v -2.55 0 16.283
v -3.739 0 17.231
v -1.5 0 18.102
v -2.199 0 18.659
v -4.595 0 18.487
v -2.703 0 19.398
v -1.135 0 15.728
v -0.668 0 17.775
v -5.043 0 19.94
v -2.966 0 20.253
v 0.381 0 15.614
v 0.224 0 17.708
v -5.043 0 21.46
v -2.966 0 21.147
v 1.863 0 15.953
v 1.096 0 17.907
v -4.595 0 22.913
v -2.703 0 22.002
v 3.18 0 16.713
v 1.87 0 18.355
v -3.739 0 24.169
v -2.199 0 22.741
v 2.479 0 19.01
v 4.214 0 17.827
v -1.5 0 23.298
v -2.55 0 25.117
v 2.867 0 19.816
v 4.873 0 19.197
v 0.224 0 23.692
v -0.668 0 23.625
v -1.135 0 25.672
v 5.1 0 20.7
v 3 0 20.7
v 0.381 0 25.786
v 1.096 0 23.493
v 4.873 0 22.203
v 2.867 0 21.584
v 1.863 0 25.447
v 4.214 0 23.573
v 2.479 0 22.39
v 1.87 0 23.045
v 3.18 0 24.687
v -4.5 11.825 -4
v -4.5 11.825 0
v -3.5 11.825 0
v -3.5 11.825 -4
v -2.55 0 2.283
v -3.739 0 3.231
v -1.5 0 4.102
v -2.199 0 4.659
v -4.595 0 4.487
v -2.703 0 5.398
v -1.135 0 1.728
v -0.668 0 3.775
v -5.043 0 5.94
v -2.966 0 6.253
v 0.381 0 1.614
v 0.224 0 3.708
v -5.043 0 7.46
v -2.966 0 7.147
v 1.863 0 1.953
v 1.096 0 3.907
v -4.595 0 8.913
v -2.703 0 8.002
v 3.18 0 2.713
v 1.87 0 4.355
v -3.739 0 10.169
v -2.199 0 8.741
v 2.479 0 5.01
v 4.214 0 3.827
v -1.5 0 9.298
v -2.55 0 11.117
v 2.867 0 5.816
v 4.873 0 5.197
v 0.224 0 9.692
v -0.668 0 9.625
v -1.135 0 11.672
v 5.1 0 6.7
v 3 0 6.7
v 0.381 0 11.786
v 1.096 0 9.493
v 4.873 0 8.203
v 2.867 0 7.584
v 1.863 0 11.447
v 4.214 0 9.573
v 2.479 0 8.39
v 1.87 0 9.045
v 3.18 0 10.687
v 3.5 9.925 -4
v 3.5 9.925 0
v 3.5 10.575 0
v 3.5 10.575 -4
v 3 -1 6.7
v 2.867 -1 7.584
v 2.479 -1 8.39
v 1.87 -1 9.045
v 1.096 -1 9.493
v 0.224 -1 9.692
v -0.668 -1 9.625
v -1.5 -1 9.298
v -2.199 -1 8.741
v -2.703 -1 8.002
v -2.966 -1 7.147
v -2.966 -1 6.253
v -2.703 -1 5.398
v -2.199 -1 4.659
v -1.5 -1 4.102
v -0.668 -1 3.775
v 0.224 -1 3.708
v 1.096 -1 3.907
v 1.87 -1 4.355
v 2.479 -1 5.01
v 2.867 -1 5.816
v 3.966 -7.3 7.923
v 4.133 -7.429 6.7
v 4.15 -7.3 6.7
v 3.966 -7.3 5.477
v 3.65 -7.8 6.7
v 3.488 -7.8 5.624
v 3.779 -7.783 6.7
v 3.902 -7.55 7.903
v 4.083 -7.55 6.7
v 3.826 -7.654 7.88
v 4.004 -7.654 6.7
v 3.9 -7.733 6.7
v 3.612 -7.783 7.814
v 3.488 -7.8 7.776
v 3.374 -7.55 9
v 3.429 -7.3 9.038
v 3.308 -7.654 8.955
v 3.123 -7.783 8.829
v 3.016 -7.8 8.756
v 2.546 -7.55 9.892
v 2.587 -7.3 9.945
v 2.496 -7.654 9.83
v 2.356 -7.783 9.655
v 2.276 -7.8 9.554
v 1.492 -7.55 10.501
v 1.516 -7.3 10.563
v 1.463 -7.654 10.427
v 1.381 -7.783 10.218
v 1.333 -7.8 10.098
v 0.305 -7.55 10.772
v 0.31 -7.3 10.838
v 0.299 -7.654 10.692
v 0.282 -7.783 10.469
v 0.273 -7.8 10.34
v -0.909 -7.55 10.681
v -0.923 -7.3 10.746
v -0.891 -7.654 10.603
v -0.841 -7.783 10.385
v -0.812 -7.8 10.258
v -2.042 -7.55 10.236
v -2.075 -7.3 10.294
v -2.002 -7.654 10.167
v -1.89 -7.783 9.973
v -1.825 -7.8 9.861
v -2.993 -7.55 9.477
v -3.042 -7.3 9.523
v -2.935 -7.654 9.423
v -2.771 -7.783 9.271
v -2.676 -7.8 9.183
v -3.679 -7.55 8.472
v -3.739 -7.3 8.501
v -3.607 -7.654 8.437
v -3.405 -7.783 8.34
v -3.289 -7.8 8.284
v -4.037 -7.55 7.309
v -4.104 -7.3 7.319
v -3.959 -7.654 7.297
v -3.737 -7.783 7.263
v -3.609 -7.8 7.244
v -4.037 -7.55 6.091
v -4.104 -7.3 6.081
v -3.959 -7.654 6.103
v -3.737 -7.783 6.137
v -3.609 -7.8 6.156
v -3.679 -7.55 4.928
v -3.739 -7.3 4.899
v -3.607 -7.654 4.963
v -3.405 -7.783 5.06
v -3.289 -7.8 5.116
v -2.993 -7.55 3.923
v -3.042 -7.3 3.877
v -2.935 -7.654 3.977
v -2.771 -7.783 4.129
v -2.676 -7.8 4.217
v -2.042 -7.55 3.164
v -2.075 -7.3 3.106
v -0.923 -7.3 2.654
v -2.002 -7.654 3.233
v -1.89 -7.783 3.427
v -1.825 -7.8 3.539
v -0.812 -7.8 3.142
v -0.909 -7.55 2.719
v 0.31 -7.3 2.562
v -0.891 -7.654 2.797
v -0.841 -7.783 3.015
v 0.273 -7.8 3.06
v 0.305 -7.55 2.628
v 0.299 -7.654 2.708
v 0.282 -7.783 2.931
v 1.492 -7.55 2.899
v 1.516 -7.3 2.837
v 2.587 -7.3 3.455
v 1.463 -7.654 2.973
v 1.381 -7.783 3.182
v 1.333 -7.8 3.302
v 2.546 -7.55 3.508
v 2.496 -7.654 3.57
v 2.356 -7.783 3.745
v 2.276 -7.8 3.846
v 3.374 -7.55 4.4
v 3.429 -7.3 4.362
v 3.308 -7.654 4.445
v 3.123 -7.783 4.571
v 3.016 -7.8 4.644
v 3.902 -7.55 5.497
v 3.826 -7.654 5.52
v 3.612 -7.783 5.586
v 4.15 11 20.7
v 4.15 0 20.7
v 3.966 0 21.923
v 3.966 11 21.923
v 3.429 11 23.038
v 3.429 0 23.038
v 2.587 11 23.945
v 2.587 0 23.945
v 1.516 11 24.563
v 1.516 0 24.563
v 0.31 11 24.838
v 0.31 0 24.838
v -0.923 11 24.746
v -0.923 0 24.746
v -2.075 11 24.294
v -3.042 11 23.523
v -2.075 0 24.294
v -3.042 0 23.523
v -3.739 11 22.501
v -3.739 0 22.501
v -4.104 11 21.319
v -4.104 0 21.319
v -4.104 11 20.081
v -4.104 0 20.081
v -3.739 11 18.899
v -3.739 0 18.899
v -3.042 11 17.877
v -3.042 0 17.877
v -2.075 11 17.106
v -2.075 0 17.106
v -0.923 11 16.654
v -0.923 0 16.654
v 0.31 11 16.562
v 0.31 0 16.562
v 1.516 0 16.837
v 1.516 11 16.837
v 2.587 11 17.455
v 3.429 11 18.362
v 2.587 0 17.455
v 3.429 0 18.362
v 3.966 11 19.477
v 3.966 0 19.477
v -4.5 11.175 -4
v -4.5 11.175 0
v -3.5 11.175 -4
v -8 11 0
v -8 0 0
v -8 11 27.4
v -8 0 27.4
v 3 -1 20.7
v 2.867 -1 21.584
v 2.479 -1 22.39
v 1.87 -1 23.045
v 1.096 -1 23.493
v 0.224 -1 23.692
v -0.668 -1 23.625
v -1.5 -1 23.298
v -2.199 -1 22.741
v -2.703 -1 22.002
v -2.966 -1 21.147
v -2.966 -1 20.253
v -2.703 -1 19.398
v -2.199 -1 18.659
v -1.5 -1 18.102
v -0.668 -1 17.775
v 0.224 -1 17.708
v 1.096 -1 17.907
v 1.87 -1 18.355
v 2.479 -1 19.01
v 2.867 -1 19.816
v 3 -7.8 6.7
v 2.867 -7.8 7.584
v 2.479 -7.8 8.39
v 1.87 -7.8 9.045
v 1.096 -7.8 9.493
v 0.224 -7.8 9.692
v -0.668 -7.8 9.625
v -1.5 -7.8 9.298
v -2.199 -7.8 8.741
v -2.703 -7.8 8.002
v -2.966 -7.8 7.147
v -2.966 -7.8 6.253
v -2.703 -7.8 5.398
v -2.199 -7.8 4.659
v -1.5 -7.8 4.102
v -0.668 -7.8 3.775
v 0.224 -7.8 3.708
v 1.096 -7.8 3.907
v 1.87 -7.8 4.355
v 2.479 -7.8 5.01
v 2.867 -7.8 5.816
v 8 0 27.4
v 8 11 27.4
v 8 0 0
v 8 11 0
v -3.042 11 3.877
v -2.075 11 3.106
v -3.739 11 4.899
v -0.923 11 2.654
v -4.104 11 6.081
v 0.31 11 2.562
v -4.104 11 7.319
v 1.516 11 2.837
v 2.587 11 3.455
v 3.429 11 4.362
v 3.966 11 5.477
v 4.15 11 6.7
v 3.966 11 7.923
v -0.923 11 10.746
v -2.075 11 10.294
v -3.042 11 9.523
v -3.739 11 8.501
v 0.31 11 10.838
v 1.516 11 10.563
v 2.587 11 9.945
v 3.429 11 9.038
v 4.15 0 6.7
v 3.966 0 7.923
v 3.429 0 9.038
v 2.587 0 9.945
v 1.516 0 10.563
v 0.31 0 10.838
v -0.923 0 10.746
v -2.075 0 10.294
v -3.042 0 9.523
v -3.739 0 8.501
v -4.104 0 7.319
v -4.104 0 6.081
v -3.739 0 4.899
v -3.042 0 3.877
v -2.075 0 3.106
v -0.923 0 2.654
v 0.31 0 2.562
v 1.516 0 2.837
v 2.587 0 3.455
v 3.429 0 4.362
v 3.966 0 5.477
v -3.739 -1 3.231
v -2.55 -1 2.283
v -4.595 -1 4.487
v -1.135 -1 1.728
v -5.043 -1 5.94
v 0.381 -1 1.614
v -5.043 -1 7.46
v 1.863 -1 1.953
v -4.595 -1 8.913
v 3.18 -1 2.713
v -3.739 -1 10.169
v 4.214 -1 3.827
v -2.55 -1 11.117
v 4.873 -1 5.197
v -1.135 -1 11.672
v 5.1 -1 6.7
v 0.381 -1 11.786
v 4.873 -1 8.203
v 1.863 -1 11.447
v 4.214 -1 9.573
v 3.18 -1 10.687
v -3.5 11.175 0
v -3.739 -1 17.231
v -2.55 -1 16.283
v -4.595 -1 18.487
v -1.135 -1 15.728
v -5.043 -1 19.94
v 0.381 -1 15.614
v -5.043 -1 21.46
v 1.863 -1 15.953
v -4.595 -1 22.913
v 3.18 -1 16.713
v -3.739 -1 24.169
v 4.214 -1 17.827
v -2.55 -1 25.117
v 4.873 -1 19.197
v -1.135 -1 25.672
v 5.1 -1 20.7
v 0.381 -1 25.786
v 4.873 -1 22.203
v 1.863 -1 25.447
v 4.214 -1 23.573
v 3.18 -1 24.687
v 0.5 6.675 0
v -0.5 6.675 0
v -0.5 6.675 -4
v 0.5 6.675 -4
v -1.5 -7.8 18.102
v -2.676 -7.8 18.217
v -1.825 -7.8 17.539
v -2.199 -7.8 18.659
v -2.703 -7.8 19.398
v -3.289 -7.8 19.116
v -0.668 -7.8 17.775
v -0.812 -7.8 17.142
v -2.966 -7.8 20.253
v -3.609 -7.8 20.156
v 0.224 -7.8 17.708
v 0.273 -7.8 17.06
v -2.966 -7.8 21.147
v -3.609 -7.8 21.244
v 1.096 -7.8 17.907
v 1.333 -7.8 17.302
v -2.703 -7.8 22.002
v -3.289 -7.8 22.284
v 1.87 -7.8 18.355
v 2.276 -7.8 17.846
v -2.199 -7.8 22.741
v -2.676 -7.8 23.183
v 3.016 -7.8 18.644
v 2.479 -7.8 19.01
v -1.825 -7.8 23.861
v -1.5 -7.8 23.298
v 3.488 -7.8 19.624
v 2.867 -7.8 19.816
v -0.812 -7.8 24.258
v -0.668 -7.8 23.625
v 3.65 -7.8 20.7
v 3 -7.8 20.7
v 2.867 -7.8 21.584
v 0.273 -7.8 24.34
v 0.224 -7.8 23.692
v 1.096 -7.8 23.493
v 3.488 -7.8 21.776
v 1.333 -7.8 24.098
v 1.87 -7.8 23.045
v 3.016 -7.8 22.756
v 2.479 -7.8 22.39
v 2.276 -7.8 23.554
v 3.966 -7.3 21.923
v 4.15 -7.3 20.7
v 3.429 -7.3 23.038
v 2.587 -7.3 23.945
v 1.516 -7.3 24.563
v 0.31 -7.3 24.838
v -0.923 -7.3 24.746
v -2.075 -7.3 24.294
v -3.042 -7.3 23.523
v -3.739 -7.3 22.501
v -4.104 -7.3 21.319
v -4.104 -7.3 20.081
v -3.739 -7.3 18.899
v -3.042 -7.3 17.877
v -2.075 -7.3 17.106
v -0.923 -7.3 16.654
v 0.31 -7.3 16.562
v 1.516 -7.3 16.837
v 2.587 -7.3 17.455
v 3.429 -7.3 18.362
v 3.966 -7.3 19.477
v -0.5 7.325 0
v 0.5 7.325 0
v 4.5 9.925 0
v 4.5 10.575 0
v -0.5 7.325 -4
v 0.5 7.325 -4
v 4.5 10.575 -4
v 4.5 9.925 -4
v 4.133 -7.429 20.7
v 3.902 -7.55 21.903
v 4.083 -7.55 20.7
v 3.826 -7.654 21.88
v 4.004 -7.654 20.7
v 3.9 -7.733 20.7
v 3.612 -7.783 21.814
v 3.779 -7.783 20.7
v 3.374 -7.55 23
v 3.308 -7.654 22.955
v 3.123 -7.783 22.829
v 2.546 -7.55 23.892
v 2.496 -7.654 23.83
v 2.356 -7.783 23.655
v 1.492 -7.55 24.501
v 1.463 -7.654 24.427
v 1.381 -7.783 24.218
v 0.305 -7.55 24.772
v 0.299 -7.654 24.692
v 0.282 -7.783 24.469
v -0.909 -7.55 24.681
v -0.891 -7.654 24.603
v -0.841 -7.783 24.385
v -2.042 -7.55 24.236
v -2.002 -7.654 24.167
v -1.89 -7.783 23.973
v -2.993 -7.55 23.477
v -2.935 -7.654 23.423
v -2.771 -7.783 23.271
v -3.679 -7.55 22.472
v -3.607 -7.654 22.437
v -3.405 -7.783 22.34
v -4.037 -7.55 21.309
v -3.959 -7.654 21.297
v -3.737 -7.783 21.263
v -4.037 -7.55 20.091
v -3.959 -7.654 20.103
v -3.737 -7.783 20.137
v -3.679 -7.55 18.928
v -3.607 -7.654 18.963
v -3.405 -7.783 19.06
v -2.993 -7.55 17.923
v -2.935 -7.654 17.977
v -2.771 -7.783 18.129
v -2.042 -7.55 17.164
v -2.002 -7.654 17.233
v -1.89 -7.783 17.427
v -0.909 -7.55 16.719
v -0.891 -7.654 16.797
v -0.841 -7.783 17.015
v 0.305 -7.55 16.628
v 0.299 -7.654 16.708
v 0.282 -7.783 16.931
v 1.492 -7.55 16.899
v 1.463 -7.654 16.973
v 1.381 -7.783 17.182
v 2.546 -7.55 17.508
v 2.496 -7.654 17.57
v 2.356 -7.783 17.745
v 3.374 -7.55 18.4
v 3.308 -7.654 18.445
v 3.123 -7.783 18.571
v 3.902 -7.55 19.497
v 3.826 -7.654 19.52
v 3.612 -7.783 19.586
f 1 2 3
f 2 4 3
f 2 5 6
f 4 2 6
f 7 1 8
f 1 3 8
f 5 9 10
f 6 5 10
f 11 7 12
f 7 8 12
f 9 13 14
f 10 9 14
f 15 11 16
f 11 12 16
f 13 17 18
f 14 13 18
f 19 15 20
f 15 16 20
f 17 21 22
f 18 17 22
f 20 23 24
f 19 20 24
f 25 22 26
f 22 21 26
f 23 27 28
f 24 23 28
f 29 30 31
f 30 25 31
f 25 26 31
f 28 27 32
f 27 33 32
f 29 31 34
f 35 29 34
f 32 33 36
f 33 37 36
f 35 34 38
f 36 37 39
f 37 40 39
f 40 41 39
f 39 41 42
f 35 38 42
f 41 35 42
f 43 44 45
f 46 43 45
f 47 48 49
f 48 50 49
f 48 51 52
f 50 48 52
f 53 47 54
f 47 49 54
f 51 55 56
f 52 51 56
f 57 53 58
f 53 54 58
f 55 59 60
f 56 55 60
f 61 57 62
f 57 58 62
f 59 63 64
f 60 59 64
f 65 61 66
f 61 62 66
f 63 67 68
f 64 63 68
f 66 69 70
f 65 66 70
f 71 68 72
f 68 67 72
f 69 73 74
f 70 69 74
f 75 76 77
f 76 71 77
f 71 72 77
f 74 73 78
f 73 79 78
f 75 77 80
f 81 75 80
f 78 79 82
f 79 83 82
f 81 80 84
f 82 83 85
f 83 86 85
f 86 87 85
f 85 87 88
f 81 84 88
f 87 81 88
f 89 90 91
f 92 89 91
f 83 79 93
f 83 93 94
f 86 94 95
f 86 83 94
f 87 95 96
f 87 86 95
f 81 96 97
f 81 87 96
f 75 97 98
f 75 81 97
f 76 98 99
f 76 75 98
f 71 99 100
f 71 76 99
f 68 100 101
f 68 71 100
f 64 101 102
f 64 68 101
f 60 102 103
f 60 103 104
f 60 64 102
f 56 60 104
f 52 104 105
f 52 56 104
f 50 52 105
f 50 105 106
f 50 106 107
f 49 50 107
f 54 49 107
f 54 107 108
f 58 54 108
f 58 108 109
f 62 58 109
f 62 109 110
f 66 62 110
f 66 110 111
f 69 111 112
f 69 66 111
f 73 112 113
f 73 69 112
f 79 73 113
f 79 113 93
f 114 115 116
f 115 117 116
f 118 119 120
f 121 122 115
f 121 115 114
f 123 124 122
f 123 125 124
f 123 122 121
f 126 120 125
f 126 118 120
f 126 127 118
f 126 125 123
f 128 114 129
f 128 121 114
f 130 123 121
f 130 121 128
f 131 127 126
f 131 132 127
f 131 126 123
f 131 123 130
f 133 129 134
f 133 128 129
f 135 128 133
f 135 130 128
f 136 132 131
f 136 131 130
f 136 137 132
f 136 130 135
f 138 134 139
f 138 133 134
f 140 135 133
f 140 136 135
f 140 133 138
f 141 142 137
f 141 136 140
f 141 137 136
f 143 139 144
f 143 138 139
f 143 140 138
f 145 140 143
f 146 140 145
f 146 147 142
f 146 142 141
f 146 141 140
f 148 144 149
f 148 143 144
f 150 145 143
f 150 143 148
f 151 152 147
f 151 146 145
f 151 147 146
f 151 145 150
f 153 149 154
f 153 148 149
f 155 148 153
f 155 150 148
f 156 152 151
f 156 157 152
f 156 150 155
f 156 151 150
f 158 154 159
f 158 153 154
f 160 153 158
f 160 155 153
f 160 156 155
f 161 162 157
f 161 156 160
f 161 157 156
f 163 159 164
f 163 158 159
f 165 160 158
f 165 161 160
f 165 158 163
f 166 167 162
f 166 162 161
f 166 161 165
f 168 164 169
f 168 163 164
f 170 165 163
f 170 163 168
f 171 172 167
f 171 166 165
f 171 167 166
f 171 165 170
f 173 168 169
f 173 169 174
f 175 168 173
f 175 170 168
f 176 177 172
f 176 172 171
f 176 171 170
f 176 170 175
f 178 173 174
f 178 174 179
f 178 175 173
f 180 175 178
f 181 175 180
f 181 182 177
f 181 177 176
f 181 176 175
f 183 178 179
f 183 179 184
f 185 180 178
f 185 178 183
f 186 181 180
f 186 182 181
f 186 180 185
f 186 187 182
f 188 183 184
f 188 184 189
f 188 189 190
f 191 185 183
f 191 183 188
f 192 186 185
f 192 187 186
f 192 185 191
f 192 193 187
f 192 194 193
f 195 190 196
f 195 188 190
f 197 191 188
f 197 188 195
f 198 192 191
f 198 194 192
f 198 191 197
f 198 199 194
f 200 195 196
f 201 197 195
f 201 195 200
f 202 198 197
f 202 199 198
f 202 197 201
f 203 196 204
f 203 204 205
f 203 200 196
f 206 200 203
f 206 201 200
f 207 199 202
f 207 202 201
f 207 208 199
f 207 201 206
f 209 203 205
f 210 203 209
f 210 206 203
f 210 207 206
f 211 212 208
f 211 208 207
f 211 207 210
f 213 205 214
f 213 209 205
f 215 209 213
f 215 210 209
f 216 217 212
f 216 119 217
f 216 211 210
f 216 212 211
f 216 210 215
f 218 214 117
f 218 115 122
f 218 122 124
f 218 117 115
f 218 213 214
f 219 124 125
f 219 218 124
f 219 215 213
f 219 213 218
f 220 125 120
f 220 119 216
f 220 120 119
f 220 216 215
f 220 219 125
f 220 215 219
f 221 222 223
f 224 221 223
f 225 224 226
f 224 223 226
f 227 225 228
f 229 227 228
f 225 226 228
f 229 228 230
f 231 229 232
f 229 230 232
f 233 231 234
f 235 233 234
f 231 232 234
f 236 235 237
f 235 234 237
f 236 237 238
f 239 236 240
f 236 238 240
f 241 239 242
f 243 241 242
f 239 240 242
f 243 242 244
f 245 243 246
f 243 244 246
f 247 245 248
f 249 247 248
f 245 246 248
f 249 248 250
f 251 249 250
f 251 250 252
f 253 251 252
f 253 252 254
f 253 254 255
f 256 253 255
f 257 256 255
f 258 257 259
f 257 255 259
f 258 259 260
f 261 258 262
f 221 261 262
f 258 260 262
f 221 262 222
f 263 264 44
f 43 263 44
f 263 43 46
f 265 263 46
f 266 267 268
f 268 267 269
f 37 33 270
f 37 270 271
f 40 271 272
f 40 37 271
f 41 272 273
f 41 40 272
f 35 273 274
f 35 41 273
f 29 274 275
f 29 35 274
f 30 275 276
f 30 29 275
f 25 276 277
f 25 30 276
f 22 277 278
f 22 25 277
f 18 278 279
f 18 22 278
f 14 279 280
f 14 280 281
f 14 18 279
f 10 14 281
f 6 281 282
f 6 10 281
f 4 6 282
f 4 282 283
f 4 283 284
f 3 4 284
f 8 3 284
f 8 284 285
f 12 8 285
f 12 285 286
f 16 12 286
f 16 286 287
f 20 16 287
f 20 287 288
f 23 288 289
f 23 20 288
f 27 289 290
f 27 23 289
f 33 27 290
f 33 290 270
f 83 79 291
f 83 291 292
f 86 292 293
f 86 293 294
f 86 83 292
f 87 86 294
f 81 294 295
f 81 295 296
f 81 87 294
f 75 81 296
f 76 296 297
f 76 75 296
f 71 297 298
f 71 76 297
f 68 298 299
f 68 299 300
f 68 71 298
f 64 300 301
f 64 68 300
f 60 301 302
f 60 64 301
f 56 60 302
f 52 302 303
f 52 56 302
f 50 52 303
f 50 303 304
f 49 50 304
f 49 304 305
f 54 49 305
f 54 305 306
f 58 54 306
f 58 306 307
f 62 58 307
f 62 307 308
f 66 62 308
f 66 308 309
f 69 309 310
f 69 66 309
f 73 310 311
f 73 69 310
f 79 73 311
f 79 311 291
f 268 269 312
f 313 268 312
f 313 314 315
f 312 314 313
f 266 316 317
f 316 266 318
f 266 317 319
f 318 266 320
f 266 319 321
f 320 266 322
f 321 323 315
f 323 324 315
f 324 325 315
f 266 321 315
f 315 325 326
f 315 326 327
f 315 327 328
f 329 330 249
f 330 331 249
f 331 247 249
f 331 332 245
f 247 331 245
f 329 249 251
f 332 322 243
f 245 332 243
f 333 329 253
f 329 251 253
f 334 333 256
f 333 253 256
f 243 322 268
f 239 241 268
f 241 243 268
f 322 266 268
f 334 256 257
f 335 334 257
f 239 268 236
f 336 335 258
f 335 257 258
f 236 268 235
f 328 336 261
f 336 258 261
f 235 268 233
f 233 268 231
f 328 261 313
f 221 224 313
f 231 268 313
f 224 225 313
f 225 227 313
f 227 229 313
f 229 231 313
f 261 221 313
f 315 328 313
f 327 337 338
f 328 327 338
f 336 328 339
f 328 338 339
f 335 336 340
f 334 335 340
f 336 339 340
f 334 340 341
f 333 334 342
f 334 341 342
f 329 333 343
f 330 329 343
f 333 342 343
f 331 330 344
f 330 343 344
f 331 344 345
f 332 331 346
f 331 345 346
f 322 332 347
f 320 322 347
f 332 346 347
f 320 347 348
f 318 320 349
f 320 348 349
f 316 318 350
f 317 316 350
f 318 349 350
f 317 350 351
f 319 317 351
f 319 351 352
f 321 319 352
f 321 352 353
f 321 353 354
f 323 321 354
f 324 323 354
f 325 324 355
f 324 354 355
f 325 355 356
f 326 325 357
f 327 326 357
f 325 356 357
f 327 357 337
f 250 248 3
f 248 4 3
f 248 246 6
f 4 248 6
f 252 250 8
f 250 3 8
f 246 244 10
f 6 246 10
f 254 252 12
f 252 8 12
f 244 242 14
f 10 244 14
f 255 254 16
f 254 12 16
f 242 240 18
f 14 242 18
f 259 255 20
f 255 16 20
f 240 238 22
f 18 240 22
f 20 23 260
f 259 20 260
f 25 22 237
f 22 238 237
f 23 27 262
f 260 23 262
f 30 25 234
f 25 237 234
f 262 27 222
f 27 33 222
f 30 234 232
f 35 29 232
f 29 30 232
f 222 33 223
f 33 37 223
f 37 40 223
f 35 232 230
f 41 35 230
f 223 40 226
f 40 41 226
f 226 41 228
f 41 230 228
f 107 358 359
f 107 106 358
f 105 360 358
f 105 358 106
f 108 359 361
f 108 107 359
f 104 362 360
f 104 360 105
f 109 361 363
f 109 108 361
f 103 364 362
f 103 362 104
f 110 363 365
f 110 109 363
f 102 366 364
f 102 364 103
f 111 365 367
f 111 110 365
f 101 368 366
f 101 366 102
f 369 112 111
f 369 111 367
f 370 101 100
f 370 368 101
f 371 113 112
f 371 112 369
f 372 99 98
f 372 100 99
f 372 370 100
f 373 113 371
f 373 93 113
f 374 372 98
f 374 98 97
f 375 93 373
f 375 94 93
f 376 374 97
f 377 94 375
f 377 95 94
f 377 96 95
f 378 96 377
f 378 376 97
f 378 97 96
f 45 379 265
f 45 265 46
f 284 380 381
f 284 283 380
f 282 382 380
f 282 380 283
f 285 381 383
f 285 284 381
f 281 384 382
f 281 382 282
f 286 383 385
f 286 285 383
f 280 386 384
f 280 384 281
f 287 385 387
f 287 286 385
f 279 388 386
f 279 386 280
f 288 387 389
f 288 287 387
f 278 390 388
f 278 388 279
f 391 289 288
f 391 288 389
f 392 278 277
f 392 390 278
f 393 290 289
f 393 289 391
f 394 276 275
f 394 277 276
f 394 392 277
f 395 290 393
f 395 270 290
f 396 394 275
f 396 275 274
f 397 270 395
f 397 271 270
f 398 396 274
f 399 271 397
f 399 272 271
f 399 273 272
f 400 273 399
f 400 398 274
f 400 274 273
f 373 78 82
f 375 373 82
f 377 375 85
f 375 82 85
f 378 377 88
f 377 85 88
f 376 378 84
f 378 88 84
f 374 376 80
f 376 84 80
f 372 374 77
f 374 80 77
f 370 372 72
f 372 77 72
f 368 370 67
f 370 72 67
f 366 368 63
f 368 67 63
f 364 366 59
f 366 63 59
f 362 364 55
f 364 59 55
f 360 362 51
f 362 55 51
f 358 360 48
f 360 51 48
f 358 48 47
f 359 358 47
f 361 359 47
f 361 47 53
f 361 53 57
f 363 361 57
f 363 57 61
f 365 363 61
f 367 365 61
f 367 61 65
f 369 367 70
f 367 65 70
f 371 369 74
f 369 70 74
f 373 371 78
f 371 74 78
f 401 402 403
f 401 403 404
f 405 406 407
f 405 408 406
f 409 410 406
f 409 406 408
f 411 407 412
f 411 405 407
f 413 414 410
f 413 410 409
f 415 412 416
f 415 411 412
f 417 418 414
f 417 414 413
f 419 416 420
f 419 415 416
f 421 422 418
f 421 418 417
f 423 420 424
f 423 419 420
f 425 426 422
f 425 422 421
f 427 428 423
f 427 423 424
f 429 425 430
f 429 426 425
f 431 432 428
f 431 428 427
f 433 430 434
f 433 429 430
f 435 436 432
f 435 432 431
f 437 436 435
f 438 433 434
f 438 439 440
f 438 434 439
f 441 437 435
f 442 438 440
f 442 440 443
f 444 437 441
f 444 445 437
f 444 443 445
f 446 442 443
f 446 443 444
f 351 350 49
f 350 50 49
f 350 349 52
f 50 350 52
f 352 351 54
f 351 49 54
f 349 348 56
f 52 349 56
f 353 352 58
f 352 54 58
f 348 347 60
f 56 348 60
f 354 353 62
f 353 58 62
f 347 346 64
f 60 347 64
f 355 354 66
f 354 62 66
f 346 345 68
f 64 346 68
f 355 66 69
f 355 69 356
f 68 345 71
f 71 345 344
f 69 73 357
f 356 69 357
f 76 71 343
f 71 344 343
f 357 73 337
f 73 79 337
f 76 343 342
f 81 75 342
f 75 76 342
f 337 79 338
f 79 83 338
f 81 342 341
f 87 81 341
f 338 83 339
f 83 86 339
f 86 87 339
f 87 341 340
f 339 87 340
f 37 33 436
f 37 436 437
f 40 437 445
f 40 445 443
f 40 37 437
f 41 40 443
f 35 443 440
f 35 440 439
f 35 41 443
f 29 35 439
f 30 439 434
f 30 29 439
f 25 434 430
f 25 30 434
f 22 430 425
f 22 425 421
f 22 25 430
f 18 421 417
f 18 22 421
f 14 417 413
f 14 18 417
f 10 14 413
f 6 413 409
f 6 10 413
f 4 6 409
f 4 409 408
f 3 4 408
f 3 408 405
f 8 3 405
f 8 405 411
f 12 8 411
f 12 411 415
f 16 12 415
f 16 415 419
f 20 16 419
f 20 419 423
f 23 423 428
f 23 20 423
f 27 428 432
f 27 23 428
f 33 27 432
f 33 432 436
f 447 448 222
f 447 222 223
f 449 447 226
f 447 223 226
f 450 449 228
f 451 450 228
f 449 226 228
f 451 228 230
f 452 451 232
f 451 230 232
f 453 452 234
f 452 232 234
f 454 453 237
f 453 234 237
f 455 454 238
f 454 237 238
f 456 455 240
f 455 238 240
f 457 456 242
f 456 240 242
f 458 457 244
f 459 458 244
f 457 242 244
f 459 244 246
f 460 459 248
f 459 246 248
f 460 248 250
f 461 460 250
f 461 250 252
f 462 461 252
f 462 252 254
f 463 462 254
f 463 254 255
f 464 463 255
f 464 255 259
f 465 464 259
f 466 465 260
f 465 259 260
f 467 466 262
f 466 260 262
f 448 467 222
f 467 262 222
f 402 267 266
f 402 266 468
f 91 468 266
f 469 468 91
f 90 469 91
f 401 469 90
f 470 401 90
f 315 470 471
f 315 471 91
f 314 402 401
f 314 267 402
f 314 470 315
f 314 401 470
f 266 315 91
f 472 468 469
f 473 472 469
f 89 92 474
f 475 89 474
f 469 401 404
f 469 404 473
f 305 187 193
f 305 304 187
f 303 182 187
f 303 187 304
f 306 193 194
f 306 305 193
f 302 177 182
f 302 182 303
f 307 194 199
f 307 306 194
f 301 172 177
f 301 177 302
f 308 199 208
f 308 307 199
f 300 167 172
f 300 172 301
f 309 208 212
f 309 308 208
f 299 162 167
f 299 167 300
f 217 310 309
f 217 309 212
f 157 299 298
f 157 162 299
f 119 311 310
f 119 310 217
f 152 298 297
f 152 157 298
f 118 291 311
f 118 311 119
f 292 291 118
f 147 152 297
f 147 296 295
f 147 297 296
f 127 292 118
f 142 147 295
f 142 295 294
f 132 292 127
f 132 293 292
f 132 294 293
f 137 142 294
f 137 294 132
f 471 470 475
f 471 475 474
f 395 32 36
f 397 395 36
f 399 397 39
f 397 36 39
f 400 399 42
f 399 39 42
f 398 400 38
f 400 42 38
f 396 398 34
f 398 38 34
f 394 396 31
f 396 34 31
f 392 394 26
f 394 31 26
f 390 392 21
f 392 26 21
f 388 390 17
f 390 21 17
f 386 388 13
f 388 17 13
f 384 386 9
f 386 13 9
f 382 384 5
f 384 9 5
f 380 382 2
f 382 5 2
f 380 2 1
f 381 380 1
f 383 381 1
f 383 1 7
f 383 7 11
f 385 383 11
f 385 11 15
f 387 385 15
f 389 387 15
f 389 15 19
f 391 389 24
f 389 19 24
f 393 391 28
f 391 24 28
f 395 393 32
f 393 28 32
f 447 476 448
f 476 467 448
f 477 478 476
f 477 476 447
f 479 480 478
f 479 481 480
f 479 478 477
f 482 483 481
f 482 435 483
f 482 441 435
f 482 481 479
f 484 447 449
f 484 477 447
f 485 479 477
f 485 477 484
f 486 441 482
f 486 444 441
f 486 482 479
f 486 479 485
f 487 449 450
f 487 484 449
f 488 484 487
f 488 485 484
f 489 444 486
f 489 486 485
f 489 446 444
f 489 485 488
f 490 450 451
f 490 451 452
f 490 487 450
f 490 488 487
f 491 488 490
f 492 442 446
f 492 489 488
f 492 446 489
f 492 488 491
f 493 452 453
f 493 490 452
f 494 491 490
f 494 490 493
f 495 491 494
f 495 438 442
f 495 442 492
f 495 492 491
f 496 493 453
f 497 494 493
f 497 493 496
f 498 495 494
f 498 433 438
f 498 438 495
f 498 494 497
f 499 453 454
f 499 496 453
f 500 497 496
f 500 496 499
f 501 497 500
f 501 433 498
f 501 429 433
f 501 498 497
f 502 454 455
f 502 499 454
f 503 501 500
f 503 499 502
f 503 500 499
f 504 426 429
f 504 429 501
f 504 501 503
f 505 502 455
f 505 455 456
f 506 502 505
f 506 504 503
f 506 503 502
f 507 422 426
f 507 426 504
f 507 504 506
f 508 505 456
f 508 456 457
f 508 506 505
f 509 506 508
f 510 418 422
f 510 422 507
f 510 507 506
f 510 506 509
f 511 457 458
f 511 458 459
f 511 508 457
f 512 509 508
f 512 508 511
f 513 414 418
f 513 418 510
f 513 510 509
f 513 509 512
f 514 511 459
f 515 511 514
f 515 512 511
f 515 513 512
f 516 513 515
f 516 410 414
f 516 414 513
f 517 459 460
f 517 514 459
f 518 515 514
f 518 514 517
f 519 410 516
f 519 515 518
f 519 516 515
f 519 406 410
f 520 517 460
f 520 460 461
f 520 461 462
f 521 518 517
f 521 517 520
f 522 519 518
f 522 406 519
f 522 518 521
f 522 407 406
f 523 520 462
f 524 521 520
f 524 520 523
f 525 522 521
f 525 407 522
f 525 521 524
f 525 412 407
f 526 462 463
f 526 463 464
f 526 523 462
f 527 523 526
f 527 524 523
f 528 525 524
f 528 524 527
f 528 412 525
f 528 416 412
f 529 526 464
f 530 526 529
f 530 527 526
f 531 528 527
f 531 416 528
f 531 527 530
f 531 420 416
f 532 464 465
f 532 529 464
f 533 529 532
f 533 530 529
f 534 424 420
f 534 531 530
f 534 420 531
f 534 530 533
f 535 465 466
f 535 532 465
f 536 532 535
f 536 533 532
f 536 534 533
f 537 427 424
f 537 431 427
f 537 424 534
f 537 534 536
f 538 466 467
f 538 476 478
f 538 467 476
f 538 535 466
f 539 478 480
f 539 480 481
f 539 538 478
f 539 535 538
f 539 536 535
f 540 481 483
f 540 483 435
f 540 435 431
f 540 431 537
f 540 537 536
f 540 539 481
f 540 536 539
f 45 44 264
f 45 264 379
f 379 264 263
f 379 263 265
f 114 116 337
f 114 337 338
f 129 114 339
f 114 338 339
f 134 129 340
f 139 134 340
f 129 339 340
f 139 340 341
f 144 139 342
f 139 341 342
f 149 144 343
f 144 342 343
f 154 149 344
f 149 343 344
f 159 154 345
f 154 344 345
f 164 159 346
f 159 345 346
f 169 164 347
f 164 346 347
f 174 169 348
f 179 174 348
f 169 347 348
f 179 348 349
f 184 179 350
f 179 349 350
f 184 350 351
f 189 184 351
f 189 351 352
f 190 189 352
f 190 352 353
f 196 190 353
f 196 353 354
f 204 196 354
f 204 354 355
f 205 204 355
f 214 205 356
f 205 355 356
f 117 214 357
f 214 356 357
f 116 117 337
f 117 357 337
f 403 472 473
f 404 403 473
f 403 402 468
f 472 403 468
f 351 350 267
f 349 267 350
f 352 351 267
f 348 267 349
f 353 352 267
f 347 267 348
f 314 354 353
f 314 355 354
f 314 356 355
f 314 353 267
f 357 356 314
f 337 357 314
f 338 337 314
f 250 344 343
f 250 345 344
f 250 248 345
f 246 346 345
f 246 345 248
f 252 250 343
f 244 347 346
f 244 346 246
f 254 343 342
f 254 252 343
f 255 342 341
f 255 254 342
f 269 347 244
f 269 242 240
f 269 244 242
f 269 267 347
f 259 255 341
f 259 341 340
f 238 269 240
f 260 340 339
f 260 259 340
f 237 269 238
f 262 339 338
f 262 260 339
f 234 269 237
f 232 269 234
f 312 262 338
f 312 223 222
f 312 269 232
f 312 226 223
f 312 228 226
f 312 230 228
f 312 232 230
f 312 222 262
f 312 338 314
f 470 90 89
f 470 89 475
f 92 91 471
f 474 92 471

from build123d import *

# Parameters (mm, degrees)
F0_R     = 4.15
F0_R_2   = 3
F2_DEPTH = 7.8
F3_R     = 0.5
F1_R     = 5.1
F1_R_2   = 3
F4_DEPTH = 1
F0_W     = 16
F0_H     = 27.4
F5_DEPTH = 11
F6_W     = 1
F6_H     = 0.65
F7_DEPTH = 4


with BuildPart() as f2:
    # F0 (on Front) → F2 (new body)
    with BuildSketch(Plane.XZ):
        with Locations((0, 20.7)):
            Circle(F0_R)
        with Locations((0, 20.7)):
            Circle(F0_R_2, mode=Mode.SUBTRACT)
        with Locations((0, 6.7)):
            Circle(F0_R)
        with Locations((0, 6.7)):
            Circle(F0_R_2, mode=Mode.SUBTRACT)
    extrude(amount=F2_DEPTH)

    # F3
    f3_edges = [f2.edges().sort_by_distance(p)[0] for p in [
        (-4.15, -7.8, 20.7),
        (-4.15, -7.8, 6.7),
    ]]
    fillet(f3_edges, radius=F3_R)


with BuildPart() as f4:
    # F1 (on Front) → F4 (new body)
    with BuildSketch(Plane.XZ):
        with Locations((0, 20.7)):
            Circle(F1_R)
        with Locations((0, 20.7)):
            Circle(F1_R_2, mode=Mode.SUBTRACT)
        with Locations((0, 6.7)):
            Circle(F1_R)
        with Locations((0, 6.7)):
            Circle(F1_R_2, mode=Mode.SUBTRACT)
    extrude(amount=F4_DEPTH)


with BuildPart() as f5:
    # F0 (on Front) → F5 (new body)
    with BuildSketch(Plane.XZ):
        with Locations((0, 13.7)):
            Rectangle(F0_W, F0_H)
        with Locations((0, 6.7)):
            Circle(F0_R, mode=Mode.SUBTRACT)
        with Locations((0, 20.7)):
            Circle(F0_R, mode=Mode.SUBTRACT)
    extrude(amount=-F5_DEPTH)

    # F6 (on Top) → F7 (join)
    with BuildSketch(Plane.XY):
        with Locations((0, 7)):
            Rectangle(F6_W, F6_H)
        with Locations((-4, 11.5)):
            Rectangle(F6_W, F6_H)
        with Locations((4, 10.25)):
            Rectangle(F6_W, F6_H)
    extrude(amount=-F7_DEPTH)


solid = Compound([f2.part, f4.part, f5.part])
